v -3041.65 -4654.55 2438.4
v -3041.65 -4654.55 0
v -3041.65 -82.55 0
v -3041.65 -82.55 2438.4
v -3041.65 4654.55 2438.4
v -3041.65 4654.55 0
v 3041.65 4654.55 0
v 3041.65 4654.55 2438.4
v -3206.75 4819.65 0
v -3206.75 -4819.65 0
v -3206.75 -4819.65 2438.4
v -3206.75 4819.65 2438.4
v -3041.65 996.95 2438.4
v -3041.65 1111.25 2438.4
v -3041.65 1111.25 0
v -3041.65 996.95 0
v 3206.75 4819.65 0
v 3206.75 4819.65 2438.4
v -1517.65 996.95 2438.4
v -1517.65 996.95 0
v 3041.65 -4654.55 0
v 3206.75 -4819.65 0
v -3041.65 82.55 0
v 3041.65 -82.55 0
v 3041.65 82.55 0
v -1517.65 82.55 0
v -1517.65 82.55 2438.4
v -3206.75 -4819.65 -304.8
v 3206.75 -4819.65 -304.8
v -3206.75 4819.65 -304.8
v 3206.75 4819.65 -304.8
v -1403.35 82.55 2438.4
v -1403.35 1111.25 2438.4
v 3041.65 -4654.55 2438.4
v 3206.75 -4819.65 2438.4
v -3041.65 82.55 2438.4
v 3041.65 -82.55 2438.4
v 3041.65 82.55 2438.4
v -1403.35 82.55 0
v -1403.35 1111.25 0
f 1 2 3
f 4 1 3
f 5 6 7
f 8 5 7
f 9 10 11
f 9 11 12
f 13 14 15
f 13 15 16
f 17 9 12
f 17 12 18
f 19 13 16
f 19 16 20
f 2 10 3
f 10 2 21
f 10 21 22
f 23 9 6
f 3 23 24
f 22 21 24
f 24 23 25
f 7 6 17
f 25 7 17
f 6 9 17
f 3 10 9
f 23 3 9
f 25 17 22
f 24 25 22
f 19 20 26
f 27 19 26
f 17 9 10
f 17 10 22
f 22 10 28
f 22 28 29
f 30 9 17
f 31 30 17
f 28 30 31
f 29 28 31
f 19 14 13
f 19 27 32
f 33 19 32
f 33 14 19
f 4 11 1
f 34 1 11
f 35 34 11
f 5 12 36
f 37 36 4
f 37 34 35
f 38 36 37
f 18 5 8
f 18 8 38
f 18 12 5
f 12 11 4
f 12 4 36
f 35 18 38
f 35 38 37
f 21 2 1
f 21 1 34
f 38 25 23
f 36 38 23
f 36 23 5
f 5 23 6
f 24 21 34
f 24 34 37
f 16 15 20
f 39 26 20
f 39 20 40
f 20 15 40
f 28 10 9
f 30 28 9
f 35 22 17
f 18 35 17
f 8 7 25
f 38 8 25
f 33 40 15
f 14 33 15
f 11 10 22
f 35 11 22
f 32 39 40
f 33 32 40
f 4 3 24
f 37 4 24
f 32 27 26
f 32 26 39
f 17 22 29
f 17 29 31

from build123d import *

# Parameters (mm, degrees)
F0_W     = 6413.5
F0_H     = 9639.3
F0_W_2   = 6083.3
F0_H_2   = 4572
F0_W_3   = 1524
F0_H_3   = 914.4
F0_W_4   = 609.6
F0_H_4   = 609.6
F1_DEPTH = 304.8
F2_DEPTH = 2438.4
F3_DEPTH = 2438.4


with BuildPart() as f1:
    # F0 (on Top) → F1 (new body)
    with BuildSketch(Plane.XY):
        Rectangle(F0_W, F0_H)
        with Locations((0, -2368.55)):
            Rectangle(F0_W_2, F0_H_2, mode=Mode.SUBTRACT)
        Polygon((-3041.65, 1111.25), (-3041.65, 4654.55), (3041.65, 4654.55), (3041.65, 82.55), (-31.75, 82.55), (-641.35, 82.55), (-793.75, 82.55), (-1403.35, 82.55), (-1517.65, 82.55), (-3041.65, 82.55), (-3041.65, 996.95), align=None, mode=Mode.SUBTRACT)
        with Locations((0, -2368.55)):
            Rectangle(F0_W_2, F0_H_2)
        Polygon((3041.65, 4654.55), (-3041.65, 4654.55), (-3041.65, 1111.25), (-1403.35, 1111.25), (-1403.35, 692.15), (-793.75, 692.15), (-793.75, 82.55), (-641.35, 82.55), (-641.35, 692.15), (-31.75, 692.15), (-31.75, 82.55), (3041.65, 82.55), align=None)
        with BuildLine():
            ThreePointArc((2807.579086147, 1149.35), (2868.4783837058, 1002.3260898945), (2889.25, 844.55))
            ThreePointArc((2889.25, 844.55), (2868.4783837058, 686.7739101055), (2807.579086147, 539.75))
            ThreePointArc((2807.579086147, 539.75), (2710.7022938113, 413.4977061887), (2584.45, 316.620913853))
            ThreePointArc((2584.45, 316.620913853), (2437.4260898945, 255.7216162942), (2279.65, 234.95))
            ThreePointArc((2279.65, 234.95), (2121.8739101055, 255.7216162942), (1974.85, 316.620913853))
            ThreePointArc((1974.85, 316.620913853), (1848.5977061887, 413.4977061887), (1751.720913853, 539.75))
            ThreePointArc((1751.720913853, 539.75), (1690.8216162942, 686.7739101055), (1670.05, 844.55))
            ThreePointArc((1670.05, 844.55), (1690.8216162942, 1002.3260898945), (1751.720913853, 1149.35))
            ThreePointArc((1751.720913853, 1149.35), (1848.5977061887, 1275.6022938113), (1974.85, 1372.479086147))
            ThreePointArc((1974.85, 1372.479086147), (2121.8739101055, 1433.3783837058), (2279.65, 1454.15))
            ThreePointArc((2279.65, 1454.15), (2437.4260898945, 1433.3783837058), (2584.45, 1372.479086147))
            ThreePointArc((2584.45, 1372.479086147), (2710.7022938113, 1275.6022938113), (2807.579086147, 1149.35))
        make_face(mode=Mode.SUBTRACT)
        with Locations((-2279.65, 539.75)):
            Rectangle(F0_W_3, F0_H_3)
        with Locations((-336.55, 387.35)):
            Rectangle(F0_W_4, F0_H_4)
        with Locations((-1098.55, 387.35)):
            Rectangle(F0_W_4, F0_H_4)
        Polygon((-1403.35, 1111.25), (-3041.65, 1111.25), (-3041.65, 996.95), (-1517.65, 996.95), (-1517.65, 82.55), (-1403.35, 82.55), (-1403.35, 692.15), align=None)
        with BuildLine():
            Line((2355.85, 844.55), (2889.25, 844.55))
            ThreePointArc((2889.25, 844.55), (2868.4783837058, 1002.3260898945), (2807.579086147, 1149.35))
            Line((2807.579086147, 1149.35), (2345.6411357684, 882.65))
            ThreePointArc((2345.6411357684, 882.65), (2353.2535479632, 864.2720112368), (2355.85, 844.55))
        make_face()
        with BuildLine():
            Line((2345.6411357684, 882.65), (2807.579086147, 1149.35))
            ThreePointArc((2807.579086147, 1149.35), (2710.7022938113, 1275.6022938113), (2584.45, 1372.479086147))
            Line((2584.45, 1372.479086147), (2317.75, 910.5411357684))
            ThreePointArc((2317.75, 910.5411357684), (2333.5315367264, 898.4315367264), (2345.6411357684, 882.65))
        make_face()
        with BuildLine():
            Line((2317.75, 910.5411357684), (2584.45, 1372.479086147))
            ThreePointArc((2584.45, 1372.479086147), (2437.4260898945, 1433.3783837058), (2279.65, 1454.15))
            Line((2279.65, 1454.15), (2279.65, 920.75))
            ThreePointArc((2279.65, 920.75), (2299.3720112368, 918.1535479632), (2317.75, 910.5411357684))
        make_face()
        with BuildLine():
            Line((2279.65, 920.75), (2279.65, 1454.15))
            ThreePointArc((2279.65, 1454.15), (2121.8739101055, 1433.3783837058), (1974.85, 1372.479086147))
            Line((1974.85, 1372.479086147), (2241.55, 910.5411357684))
            ThreePointArc((2241.55, 910.5411357684), (2259.9279887632, 918.1535479632), (2279.65, 920.75))
        make_face()
        with BuildLine():
            Line((1751.720913853, 1149.35), (2213.6588642316, 882.65))
            ThreePointArc((2213.6588642316, 882.65), (2225.7684632736, 898.4315367264), (2241.55, 910.5411357684))
            Line((2241.55, 910.5411357684), (1974.85, 1372.479086147))
            ThreePointArc((1974.85, 1372.479086147), (1848.5977061887, 1275.6022938113), (1751.720913853, 1149.35))
        make_face()
        with BuildLine():
            Line((1670.05, 844.55), (2203.45, 844.55))
            ThreePointArc((2203.45, 844.55), (2206.0464520368, 864.2720112368), (2213.6588642316, 882.65))
            Line((2213.6588642316, 882.65), (1751.720913853, 1149.35))
            ThreePointArc((1751.720913853, 1149.35), (1690.8216162942, 1002.3260898945), (1670.05, 844.55))
        make_face()
        with BuildLine():
            ThreePointArc((2213.6588642316, 806.45), (2206.0464520368, 824.8279887632), (2203.45, 844.55))
            Line((2203.45, 844.55), (1670.05, 844.55))
            ThreePointArc((1670.05, 844.55), (1690.8216162942, 686.7739101055), (1751.720913853, 539.75))
            Line((1751.720913853, 539.75), (2213.6588642316, 806.45))
        make_face()
        with BuildLine():
            ThreePointArc((2241.55, 778.5588642316), (2225.7684632736, 790.6684632736), (2213.6588642316, 806.45))
            Line((2213.6588642316, 806.45), (1751.720913853, 539.75))
            ThreePointArc((1751.720913853, 539.75), (1848.5977061887, 413.4977061887), (1974.85, 316.620913853))
            Line((1974.85, 316.620913853), (2241.55, 778.5588642316))
        make_face()
        with BuildLine():
            ThreePointArc((1974.85, 316.620913853), (2121.8739101055, 255.7216162942), (2279.65, 234.95))
            Line((2279.65, 234.95), (2279.65, 768.35))
            ThreePointArc((2279.65, 768.35), (2259.9279887632, 770.9464520368), (2241.55, 778.5588642316))
            Line((2241.55, 778.5588642316), (1974.85, 316.620913853))
        make_face()
        with BuildLine():
            ThreePointArc((2279.65, 234.95), (2437.4260898945, 255.7216162942), (2584.45, 316.620913853))
            Line((2584.45, 316.620913853), (2317.75, 778.5588642316))
            ThreePointArc((2317.75, 778.5588642316), (2299.3720112368, 770.9464520368), (2279.65, 768.35))
            Line((2279.65, 768.35), (2279.65, 234.95))
        make_face()
        with BuildLine():
            ThreePointArc((2584.45, 316.620913853), (2710.7022938113, 413.4977061887), (2807.579086147, 539.75))
            Line((2807.579086147, 539.75), (2345.6411357684, 806.45))
            ThreePointArc((2345.6411357684, 806.45), (2333.5315367264, 790.6684632736), (2317.75, 778.5588642316))
            Line((2317.75, 778.5588642316), (2584.45, 316.620913853))
        make_face()
        with BuildLine():
            ThreePointArc((2807.579086147, 539.75), (2868.4783837058, 686.7739101055), (2889.25, 844.55))
            Line((2889.25, 844.55), (2355.85, 844.55))
            ThreePointArc((2355.85, 844.55), (2353.2535479632, 824.8279887632), (2345.6411357684, 806.45))
            Line((2345.6411357684, 806.45), (2807.579086147, 539.75))
        make_face()
        with BuildLine():
            Line((2279.65, 844.55), (2355.85, 844.55))
            ThreePointArc((2355.85, 844.55), (2353.2535479632, 864.2720112368), (2345.6411357684, 882.65))
            Line((2345.6411357684, 882.65), (2279.65, 844.55))
        make_face()
        with BuildLine():
            Line((2279.65, 844.55), (2345.6411357684, 882.65))
            ThreePointArc((2345.6411357684, 882.65), (2333.5315367264, 898.4315367264), (2317.75, 910.5411357684))
            Line((2317.75, 910.5411357684), (2279.65, 844.55))
        make_face()
        with BuildLine():
            Line((2279.65, 920.75), (2279.65, 844.55))
            Line((2279.65, 844.55), (2317.75, 910.5411357684))
            ThreePointArc((2317.75, 910.5411357684), (2299.3720112368, 918.1535479632), (2279.65, 920.75))
        make_face()
        with BuildLine():
            Line((2241.55, 910.5411357684), (2279.65, 844.55))
            Line((2279.65, 844.55), (2279.65, 920.75))
            ThreePointArc((2279.65, 920.75), (2259.9279887632, 918.1535479632), (2241.55, 910.5411357684))
        make_face()
        with BuildLine():
            Line((2213.6588642316, 882.65), (2279.65, 844.55))
            Line((2279.65, 844.55), (2241.55, 910.5411357684))
            ThreePointArc((2241.55, 910.5411357684), (2225.7684632736, 898.4315367264), (2213.6588642316, 882.65))
        make_face()
        with BuildLine():
            Line((2203.45, 844.55), (2279.65, 844.55))
            Line((2279.65, 844.55), (2213.6588642316, 882.65))
            ThreePointArc((2213.6588642316, 882.65), (2206.0464520368, 864.2720112368), (2203.45, 844.55))
        make_face()
        with BuildLine():
            Line((2213.6588642316, 806.45), (2279.65, 844.55))
            Line((2279.65, 844.55), (2203.45, 844.55))
            ThreePointArc((2203.45, 844.55), (2206.0464520368, 824.8279887632), (2213.6588642316, 806.45))
        make_face()
        with BuildLine():
            Line((2241.55, 778.5588642316), (2279.65, 844.55))
            Line((2279.65, 844.55), (2213.6588642316, 806.45))
            ThreePointArc((2213.6588642316, 806.45), (2225.7684632736, 790.6684632736), (2241.55, 778.5588642316))
        make_face()
        with BuildLine():
            Line((2279.65, 768.35), (2279.65, 844.55))
            Line((2279.65, 844.55), (2241.55, 778.5588642316))
            ThreePointArc((2241.55, 778.5588642316), (2259.9279887632, 770.9464520368), (2279.65, 768.35))
        make_face()
        with BuildLine():
            Line((2317.75, 778.5588642316), (2279.65, 844.55))
            Line((2279.65, 844.55), (2279.65, 768.35))
            ThreePointArc((2279.65, 768.35), (2299.3720112368, 770.9464520368), (2317.75, 778.5588642316))
        make_face()
        with BuildLine():
            ThreePointArc((2317.75, 778.5588642316), (2333.5315367264, 790.6684632736), (2345.6411357684, 806.45))
            Line((2345.6411357684, 806.45), (2279.65, 844.55))
            Line((2279.65, 844.55), (2317.75, 778.5588642316))
        make_face()
        with BuildLine():
            ThreePointArc((2345.6411357684, 806.45), (2353.2535479632, 824.8279887632), (2355.85, 844.55))
            Line((2355.85, 844.55), (2279.65, 844.55))
            Line((2279.65, 844.55), (2345.6411357684, 806.45))
        make_face()
    extrude(amount=-F1_DEPTH)


with BuildPart() as f2:
    # F0 (on Top) → F2 (new body)
    with BuildSketch(Plane.XY):
        Rectangle(F0_W, F0_H)
        with Locations((0, -2368.55)):
            Rectangle(F0_W_2, F0_H_2, mode=Mode.SUBTRACT)
        Polygon((-3041.65, 1111.25), (-3041.65, 4654.55), (3041.65, 4654.55), (3041.65, 82.55), (-31.75, 82.55), (-641.35, 82.55), (-793.75, 82.55), (-1403.35, 82.55), (-1517.65, 82.55), (-3041.65, 82.55), (-3041.65, 996.95), align=None, mode=Mode.SUBTRACT)
    extrude(amount=F2_DEPTH)


with BuildPart() as f3:
    # F0 (on Top) → F3 (new body)
    with BuildSketch(Plane.XY):
        Polygon((-1403.35, 1111.25), (-3041.65, 1111.25), (-3041.65, 996.95), (-1517.65, 996.95), (-1517.65, 82.55), (-1403.35, 82.55), (-1403.35, 692.15), align=None)
    extrude(amount=F3_DEPTH)


solid = Compound([f1.part, f2.part, f3.part])
